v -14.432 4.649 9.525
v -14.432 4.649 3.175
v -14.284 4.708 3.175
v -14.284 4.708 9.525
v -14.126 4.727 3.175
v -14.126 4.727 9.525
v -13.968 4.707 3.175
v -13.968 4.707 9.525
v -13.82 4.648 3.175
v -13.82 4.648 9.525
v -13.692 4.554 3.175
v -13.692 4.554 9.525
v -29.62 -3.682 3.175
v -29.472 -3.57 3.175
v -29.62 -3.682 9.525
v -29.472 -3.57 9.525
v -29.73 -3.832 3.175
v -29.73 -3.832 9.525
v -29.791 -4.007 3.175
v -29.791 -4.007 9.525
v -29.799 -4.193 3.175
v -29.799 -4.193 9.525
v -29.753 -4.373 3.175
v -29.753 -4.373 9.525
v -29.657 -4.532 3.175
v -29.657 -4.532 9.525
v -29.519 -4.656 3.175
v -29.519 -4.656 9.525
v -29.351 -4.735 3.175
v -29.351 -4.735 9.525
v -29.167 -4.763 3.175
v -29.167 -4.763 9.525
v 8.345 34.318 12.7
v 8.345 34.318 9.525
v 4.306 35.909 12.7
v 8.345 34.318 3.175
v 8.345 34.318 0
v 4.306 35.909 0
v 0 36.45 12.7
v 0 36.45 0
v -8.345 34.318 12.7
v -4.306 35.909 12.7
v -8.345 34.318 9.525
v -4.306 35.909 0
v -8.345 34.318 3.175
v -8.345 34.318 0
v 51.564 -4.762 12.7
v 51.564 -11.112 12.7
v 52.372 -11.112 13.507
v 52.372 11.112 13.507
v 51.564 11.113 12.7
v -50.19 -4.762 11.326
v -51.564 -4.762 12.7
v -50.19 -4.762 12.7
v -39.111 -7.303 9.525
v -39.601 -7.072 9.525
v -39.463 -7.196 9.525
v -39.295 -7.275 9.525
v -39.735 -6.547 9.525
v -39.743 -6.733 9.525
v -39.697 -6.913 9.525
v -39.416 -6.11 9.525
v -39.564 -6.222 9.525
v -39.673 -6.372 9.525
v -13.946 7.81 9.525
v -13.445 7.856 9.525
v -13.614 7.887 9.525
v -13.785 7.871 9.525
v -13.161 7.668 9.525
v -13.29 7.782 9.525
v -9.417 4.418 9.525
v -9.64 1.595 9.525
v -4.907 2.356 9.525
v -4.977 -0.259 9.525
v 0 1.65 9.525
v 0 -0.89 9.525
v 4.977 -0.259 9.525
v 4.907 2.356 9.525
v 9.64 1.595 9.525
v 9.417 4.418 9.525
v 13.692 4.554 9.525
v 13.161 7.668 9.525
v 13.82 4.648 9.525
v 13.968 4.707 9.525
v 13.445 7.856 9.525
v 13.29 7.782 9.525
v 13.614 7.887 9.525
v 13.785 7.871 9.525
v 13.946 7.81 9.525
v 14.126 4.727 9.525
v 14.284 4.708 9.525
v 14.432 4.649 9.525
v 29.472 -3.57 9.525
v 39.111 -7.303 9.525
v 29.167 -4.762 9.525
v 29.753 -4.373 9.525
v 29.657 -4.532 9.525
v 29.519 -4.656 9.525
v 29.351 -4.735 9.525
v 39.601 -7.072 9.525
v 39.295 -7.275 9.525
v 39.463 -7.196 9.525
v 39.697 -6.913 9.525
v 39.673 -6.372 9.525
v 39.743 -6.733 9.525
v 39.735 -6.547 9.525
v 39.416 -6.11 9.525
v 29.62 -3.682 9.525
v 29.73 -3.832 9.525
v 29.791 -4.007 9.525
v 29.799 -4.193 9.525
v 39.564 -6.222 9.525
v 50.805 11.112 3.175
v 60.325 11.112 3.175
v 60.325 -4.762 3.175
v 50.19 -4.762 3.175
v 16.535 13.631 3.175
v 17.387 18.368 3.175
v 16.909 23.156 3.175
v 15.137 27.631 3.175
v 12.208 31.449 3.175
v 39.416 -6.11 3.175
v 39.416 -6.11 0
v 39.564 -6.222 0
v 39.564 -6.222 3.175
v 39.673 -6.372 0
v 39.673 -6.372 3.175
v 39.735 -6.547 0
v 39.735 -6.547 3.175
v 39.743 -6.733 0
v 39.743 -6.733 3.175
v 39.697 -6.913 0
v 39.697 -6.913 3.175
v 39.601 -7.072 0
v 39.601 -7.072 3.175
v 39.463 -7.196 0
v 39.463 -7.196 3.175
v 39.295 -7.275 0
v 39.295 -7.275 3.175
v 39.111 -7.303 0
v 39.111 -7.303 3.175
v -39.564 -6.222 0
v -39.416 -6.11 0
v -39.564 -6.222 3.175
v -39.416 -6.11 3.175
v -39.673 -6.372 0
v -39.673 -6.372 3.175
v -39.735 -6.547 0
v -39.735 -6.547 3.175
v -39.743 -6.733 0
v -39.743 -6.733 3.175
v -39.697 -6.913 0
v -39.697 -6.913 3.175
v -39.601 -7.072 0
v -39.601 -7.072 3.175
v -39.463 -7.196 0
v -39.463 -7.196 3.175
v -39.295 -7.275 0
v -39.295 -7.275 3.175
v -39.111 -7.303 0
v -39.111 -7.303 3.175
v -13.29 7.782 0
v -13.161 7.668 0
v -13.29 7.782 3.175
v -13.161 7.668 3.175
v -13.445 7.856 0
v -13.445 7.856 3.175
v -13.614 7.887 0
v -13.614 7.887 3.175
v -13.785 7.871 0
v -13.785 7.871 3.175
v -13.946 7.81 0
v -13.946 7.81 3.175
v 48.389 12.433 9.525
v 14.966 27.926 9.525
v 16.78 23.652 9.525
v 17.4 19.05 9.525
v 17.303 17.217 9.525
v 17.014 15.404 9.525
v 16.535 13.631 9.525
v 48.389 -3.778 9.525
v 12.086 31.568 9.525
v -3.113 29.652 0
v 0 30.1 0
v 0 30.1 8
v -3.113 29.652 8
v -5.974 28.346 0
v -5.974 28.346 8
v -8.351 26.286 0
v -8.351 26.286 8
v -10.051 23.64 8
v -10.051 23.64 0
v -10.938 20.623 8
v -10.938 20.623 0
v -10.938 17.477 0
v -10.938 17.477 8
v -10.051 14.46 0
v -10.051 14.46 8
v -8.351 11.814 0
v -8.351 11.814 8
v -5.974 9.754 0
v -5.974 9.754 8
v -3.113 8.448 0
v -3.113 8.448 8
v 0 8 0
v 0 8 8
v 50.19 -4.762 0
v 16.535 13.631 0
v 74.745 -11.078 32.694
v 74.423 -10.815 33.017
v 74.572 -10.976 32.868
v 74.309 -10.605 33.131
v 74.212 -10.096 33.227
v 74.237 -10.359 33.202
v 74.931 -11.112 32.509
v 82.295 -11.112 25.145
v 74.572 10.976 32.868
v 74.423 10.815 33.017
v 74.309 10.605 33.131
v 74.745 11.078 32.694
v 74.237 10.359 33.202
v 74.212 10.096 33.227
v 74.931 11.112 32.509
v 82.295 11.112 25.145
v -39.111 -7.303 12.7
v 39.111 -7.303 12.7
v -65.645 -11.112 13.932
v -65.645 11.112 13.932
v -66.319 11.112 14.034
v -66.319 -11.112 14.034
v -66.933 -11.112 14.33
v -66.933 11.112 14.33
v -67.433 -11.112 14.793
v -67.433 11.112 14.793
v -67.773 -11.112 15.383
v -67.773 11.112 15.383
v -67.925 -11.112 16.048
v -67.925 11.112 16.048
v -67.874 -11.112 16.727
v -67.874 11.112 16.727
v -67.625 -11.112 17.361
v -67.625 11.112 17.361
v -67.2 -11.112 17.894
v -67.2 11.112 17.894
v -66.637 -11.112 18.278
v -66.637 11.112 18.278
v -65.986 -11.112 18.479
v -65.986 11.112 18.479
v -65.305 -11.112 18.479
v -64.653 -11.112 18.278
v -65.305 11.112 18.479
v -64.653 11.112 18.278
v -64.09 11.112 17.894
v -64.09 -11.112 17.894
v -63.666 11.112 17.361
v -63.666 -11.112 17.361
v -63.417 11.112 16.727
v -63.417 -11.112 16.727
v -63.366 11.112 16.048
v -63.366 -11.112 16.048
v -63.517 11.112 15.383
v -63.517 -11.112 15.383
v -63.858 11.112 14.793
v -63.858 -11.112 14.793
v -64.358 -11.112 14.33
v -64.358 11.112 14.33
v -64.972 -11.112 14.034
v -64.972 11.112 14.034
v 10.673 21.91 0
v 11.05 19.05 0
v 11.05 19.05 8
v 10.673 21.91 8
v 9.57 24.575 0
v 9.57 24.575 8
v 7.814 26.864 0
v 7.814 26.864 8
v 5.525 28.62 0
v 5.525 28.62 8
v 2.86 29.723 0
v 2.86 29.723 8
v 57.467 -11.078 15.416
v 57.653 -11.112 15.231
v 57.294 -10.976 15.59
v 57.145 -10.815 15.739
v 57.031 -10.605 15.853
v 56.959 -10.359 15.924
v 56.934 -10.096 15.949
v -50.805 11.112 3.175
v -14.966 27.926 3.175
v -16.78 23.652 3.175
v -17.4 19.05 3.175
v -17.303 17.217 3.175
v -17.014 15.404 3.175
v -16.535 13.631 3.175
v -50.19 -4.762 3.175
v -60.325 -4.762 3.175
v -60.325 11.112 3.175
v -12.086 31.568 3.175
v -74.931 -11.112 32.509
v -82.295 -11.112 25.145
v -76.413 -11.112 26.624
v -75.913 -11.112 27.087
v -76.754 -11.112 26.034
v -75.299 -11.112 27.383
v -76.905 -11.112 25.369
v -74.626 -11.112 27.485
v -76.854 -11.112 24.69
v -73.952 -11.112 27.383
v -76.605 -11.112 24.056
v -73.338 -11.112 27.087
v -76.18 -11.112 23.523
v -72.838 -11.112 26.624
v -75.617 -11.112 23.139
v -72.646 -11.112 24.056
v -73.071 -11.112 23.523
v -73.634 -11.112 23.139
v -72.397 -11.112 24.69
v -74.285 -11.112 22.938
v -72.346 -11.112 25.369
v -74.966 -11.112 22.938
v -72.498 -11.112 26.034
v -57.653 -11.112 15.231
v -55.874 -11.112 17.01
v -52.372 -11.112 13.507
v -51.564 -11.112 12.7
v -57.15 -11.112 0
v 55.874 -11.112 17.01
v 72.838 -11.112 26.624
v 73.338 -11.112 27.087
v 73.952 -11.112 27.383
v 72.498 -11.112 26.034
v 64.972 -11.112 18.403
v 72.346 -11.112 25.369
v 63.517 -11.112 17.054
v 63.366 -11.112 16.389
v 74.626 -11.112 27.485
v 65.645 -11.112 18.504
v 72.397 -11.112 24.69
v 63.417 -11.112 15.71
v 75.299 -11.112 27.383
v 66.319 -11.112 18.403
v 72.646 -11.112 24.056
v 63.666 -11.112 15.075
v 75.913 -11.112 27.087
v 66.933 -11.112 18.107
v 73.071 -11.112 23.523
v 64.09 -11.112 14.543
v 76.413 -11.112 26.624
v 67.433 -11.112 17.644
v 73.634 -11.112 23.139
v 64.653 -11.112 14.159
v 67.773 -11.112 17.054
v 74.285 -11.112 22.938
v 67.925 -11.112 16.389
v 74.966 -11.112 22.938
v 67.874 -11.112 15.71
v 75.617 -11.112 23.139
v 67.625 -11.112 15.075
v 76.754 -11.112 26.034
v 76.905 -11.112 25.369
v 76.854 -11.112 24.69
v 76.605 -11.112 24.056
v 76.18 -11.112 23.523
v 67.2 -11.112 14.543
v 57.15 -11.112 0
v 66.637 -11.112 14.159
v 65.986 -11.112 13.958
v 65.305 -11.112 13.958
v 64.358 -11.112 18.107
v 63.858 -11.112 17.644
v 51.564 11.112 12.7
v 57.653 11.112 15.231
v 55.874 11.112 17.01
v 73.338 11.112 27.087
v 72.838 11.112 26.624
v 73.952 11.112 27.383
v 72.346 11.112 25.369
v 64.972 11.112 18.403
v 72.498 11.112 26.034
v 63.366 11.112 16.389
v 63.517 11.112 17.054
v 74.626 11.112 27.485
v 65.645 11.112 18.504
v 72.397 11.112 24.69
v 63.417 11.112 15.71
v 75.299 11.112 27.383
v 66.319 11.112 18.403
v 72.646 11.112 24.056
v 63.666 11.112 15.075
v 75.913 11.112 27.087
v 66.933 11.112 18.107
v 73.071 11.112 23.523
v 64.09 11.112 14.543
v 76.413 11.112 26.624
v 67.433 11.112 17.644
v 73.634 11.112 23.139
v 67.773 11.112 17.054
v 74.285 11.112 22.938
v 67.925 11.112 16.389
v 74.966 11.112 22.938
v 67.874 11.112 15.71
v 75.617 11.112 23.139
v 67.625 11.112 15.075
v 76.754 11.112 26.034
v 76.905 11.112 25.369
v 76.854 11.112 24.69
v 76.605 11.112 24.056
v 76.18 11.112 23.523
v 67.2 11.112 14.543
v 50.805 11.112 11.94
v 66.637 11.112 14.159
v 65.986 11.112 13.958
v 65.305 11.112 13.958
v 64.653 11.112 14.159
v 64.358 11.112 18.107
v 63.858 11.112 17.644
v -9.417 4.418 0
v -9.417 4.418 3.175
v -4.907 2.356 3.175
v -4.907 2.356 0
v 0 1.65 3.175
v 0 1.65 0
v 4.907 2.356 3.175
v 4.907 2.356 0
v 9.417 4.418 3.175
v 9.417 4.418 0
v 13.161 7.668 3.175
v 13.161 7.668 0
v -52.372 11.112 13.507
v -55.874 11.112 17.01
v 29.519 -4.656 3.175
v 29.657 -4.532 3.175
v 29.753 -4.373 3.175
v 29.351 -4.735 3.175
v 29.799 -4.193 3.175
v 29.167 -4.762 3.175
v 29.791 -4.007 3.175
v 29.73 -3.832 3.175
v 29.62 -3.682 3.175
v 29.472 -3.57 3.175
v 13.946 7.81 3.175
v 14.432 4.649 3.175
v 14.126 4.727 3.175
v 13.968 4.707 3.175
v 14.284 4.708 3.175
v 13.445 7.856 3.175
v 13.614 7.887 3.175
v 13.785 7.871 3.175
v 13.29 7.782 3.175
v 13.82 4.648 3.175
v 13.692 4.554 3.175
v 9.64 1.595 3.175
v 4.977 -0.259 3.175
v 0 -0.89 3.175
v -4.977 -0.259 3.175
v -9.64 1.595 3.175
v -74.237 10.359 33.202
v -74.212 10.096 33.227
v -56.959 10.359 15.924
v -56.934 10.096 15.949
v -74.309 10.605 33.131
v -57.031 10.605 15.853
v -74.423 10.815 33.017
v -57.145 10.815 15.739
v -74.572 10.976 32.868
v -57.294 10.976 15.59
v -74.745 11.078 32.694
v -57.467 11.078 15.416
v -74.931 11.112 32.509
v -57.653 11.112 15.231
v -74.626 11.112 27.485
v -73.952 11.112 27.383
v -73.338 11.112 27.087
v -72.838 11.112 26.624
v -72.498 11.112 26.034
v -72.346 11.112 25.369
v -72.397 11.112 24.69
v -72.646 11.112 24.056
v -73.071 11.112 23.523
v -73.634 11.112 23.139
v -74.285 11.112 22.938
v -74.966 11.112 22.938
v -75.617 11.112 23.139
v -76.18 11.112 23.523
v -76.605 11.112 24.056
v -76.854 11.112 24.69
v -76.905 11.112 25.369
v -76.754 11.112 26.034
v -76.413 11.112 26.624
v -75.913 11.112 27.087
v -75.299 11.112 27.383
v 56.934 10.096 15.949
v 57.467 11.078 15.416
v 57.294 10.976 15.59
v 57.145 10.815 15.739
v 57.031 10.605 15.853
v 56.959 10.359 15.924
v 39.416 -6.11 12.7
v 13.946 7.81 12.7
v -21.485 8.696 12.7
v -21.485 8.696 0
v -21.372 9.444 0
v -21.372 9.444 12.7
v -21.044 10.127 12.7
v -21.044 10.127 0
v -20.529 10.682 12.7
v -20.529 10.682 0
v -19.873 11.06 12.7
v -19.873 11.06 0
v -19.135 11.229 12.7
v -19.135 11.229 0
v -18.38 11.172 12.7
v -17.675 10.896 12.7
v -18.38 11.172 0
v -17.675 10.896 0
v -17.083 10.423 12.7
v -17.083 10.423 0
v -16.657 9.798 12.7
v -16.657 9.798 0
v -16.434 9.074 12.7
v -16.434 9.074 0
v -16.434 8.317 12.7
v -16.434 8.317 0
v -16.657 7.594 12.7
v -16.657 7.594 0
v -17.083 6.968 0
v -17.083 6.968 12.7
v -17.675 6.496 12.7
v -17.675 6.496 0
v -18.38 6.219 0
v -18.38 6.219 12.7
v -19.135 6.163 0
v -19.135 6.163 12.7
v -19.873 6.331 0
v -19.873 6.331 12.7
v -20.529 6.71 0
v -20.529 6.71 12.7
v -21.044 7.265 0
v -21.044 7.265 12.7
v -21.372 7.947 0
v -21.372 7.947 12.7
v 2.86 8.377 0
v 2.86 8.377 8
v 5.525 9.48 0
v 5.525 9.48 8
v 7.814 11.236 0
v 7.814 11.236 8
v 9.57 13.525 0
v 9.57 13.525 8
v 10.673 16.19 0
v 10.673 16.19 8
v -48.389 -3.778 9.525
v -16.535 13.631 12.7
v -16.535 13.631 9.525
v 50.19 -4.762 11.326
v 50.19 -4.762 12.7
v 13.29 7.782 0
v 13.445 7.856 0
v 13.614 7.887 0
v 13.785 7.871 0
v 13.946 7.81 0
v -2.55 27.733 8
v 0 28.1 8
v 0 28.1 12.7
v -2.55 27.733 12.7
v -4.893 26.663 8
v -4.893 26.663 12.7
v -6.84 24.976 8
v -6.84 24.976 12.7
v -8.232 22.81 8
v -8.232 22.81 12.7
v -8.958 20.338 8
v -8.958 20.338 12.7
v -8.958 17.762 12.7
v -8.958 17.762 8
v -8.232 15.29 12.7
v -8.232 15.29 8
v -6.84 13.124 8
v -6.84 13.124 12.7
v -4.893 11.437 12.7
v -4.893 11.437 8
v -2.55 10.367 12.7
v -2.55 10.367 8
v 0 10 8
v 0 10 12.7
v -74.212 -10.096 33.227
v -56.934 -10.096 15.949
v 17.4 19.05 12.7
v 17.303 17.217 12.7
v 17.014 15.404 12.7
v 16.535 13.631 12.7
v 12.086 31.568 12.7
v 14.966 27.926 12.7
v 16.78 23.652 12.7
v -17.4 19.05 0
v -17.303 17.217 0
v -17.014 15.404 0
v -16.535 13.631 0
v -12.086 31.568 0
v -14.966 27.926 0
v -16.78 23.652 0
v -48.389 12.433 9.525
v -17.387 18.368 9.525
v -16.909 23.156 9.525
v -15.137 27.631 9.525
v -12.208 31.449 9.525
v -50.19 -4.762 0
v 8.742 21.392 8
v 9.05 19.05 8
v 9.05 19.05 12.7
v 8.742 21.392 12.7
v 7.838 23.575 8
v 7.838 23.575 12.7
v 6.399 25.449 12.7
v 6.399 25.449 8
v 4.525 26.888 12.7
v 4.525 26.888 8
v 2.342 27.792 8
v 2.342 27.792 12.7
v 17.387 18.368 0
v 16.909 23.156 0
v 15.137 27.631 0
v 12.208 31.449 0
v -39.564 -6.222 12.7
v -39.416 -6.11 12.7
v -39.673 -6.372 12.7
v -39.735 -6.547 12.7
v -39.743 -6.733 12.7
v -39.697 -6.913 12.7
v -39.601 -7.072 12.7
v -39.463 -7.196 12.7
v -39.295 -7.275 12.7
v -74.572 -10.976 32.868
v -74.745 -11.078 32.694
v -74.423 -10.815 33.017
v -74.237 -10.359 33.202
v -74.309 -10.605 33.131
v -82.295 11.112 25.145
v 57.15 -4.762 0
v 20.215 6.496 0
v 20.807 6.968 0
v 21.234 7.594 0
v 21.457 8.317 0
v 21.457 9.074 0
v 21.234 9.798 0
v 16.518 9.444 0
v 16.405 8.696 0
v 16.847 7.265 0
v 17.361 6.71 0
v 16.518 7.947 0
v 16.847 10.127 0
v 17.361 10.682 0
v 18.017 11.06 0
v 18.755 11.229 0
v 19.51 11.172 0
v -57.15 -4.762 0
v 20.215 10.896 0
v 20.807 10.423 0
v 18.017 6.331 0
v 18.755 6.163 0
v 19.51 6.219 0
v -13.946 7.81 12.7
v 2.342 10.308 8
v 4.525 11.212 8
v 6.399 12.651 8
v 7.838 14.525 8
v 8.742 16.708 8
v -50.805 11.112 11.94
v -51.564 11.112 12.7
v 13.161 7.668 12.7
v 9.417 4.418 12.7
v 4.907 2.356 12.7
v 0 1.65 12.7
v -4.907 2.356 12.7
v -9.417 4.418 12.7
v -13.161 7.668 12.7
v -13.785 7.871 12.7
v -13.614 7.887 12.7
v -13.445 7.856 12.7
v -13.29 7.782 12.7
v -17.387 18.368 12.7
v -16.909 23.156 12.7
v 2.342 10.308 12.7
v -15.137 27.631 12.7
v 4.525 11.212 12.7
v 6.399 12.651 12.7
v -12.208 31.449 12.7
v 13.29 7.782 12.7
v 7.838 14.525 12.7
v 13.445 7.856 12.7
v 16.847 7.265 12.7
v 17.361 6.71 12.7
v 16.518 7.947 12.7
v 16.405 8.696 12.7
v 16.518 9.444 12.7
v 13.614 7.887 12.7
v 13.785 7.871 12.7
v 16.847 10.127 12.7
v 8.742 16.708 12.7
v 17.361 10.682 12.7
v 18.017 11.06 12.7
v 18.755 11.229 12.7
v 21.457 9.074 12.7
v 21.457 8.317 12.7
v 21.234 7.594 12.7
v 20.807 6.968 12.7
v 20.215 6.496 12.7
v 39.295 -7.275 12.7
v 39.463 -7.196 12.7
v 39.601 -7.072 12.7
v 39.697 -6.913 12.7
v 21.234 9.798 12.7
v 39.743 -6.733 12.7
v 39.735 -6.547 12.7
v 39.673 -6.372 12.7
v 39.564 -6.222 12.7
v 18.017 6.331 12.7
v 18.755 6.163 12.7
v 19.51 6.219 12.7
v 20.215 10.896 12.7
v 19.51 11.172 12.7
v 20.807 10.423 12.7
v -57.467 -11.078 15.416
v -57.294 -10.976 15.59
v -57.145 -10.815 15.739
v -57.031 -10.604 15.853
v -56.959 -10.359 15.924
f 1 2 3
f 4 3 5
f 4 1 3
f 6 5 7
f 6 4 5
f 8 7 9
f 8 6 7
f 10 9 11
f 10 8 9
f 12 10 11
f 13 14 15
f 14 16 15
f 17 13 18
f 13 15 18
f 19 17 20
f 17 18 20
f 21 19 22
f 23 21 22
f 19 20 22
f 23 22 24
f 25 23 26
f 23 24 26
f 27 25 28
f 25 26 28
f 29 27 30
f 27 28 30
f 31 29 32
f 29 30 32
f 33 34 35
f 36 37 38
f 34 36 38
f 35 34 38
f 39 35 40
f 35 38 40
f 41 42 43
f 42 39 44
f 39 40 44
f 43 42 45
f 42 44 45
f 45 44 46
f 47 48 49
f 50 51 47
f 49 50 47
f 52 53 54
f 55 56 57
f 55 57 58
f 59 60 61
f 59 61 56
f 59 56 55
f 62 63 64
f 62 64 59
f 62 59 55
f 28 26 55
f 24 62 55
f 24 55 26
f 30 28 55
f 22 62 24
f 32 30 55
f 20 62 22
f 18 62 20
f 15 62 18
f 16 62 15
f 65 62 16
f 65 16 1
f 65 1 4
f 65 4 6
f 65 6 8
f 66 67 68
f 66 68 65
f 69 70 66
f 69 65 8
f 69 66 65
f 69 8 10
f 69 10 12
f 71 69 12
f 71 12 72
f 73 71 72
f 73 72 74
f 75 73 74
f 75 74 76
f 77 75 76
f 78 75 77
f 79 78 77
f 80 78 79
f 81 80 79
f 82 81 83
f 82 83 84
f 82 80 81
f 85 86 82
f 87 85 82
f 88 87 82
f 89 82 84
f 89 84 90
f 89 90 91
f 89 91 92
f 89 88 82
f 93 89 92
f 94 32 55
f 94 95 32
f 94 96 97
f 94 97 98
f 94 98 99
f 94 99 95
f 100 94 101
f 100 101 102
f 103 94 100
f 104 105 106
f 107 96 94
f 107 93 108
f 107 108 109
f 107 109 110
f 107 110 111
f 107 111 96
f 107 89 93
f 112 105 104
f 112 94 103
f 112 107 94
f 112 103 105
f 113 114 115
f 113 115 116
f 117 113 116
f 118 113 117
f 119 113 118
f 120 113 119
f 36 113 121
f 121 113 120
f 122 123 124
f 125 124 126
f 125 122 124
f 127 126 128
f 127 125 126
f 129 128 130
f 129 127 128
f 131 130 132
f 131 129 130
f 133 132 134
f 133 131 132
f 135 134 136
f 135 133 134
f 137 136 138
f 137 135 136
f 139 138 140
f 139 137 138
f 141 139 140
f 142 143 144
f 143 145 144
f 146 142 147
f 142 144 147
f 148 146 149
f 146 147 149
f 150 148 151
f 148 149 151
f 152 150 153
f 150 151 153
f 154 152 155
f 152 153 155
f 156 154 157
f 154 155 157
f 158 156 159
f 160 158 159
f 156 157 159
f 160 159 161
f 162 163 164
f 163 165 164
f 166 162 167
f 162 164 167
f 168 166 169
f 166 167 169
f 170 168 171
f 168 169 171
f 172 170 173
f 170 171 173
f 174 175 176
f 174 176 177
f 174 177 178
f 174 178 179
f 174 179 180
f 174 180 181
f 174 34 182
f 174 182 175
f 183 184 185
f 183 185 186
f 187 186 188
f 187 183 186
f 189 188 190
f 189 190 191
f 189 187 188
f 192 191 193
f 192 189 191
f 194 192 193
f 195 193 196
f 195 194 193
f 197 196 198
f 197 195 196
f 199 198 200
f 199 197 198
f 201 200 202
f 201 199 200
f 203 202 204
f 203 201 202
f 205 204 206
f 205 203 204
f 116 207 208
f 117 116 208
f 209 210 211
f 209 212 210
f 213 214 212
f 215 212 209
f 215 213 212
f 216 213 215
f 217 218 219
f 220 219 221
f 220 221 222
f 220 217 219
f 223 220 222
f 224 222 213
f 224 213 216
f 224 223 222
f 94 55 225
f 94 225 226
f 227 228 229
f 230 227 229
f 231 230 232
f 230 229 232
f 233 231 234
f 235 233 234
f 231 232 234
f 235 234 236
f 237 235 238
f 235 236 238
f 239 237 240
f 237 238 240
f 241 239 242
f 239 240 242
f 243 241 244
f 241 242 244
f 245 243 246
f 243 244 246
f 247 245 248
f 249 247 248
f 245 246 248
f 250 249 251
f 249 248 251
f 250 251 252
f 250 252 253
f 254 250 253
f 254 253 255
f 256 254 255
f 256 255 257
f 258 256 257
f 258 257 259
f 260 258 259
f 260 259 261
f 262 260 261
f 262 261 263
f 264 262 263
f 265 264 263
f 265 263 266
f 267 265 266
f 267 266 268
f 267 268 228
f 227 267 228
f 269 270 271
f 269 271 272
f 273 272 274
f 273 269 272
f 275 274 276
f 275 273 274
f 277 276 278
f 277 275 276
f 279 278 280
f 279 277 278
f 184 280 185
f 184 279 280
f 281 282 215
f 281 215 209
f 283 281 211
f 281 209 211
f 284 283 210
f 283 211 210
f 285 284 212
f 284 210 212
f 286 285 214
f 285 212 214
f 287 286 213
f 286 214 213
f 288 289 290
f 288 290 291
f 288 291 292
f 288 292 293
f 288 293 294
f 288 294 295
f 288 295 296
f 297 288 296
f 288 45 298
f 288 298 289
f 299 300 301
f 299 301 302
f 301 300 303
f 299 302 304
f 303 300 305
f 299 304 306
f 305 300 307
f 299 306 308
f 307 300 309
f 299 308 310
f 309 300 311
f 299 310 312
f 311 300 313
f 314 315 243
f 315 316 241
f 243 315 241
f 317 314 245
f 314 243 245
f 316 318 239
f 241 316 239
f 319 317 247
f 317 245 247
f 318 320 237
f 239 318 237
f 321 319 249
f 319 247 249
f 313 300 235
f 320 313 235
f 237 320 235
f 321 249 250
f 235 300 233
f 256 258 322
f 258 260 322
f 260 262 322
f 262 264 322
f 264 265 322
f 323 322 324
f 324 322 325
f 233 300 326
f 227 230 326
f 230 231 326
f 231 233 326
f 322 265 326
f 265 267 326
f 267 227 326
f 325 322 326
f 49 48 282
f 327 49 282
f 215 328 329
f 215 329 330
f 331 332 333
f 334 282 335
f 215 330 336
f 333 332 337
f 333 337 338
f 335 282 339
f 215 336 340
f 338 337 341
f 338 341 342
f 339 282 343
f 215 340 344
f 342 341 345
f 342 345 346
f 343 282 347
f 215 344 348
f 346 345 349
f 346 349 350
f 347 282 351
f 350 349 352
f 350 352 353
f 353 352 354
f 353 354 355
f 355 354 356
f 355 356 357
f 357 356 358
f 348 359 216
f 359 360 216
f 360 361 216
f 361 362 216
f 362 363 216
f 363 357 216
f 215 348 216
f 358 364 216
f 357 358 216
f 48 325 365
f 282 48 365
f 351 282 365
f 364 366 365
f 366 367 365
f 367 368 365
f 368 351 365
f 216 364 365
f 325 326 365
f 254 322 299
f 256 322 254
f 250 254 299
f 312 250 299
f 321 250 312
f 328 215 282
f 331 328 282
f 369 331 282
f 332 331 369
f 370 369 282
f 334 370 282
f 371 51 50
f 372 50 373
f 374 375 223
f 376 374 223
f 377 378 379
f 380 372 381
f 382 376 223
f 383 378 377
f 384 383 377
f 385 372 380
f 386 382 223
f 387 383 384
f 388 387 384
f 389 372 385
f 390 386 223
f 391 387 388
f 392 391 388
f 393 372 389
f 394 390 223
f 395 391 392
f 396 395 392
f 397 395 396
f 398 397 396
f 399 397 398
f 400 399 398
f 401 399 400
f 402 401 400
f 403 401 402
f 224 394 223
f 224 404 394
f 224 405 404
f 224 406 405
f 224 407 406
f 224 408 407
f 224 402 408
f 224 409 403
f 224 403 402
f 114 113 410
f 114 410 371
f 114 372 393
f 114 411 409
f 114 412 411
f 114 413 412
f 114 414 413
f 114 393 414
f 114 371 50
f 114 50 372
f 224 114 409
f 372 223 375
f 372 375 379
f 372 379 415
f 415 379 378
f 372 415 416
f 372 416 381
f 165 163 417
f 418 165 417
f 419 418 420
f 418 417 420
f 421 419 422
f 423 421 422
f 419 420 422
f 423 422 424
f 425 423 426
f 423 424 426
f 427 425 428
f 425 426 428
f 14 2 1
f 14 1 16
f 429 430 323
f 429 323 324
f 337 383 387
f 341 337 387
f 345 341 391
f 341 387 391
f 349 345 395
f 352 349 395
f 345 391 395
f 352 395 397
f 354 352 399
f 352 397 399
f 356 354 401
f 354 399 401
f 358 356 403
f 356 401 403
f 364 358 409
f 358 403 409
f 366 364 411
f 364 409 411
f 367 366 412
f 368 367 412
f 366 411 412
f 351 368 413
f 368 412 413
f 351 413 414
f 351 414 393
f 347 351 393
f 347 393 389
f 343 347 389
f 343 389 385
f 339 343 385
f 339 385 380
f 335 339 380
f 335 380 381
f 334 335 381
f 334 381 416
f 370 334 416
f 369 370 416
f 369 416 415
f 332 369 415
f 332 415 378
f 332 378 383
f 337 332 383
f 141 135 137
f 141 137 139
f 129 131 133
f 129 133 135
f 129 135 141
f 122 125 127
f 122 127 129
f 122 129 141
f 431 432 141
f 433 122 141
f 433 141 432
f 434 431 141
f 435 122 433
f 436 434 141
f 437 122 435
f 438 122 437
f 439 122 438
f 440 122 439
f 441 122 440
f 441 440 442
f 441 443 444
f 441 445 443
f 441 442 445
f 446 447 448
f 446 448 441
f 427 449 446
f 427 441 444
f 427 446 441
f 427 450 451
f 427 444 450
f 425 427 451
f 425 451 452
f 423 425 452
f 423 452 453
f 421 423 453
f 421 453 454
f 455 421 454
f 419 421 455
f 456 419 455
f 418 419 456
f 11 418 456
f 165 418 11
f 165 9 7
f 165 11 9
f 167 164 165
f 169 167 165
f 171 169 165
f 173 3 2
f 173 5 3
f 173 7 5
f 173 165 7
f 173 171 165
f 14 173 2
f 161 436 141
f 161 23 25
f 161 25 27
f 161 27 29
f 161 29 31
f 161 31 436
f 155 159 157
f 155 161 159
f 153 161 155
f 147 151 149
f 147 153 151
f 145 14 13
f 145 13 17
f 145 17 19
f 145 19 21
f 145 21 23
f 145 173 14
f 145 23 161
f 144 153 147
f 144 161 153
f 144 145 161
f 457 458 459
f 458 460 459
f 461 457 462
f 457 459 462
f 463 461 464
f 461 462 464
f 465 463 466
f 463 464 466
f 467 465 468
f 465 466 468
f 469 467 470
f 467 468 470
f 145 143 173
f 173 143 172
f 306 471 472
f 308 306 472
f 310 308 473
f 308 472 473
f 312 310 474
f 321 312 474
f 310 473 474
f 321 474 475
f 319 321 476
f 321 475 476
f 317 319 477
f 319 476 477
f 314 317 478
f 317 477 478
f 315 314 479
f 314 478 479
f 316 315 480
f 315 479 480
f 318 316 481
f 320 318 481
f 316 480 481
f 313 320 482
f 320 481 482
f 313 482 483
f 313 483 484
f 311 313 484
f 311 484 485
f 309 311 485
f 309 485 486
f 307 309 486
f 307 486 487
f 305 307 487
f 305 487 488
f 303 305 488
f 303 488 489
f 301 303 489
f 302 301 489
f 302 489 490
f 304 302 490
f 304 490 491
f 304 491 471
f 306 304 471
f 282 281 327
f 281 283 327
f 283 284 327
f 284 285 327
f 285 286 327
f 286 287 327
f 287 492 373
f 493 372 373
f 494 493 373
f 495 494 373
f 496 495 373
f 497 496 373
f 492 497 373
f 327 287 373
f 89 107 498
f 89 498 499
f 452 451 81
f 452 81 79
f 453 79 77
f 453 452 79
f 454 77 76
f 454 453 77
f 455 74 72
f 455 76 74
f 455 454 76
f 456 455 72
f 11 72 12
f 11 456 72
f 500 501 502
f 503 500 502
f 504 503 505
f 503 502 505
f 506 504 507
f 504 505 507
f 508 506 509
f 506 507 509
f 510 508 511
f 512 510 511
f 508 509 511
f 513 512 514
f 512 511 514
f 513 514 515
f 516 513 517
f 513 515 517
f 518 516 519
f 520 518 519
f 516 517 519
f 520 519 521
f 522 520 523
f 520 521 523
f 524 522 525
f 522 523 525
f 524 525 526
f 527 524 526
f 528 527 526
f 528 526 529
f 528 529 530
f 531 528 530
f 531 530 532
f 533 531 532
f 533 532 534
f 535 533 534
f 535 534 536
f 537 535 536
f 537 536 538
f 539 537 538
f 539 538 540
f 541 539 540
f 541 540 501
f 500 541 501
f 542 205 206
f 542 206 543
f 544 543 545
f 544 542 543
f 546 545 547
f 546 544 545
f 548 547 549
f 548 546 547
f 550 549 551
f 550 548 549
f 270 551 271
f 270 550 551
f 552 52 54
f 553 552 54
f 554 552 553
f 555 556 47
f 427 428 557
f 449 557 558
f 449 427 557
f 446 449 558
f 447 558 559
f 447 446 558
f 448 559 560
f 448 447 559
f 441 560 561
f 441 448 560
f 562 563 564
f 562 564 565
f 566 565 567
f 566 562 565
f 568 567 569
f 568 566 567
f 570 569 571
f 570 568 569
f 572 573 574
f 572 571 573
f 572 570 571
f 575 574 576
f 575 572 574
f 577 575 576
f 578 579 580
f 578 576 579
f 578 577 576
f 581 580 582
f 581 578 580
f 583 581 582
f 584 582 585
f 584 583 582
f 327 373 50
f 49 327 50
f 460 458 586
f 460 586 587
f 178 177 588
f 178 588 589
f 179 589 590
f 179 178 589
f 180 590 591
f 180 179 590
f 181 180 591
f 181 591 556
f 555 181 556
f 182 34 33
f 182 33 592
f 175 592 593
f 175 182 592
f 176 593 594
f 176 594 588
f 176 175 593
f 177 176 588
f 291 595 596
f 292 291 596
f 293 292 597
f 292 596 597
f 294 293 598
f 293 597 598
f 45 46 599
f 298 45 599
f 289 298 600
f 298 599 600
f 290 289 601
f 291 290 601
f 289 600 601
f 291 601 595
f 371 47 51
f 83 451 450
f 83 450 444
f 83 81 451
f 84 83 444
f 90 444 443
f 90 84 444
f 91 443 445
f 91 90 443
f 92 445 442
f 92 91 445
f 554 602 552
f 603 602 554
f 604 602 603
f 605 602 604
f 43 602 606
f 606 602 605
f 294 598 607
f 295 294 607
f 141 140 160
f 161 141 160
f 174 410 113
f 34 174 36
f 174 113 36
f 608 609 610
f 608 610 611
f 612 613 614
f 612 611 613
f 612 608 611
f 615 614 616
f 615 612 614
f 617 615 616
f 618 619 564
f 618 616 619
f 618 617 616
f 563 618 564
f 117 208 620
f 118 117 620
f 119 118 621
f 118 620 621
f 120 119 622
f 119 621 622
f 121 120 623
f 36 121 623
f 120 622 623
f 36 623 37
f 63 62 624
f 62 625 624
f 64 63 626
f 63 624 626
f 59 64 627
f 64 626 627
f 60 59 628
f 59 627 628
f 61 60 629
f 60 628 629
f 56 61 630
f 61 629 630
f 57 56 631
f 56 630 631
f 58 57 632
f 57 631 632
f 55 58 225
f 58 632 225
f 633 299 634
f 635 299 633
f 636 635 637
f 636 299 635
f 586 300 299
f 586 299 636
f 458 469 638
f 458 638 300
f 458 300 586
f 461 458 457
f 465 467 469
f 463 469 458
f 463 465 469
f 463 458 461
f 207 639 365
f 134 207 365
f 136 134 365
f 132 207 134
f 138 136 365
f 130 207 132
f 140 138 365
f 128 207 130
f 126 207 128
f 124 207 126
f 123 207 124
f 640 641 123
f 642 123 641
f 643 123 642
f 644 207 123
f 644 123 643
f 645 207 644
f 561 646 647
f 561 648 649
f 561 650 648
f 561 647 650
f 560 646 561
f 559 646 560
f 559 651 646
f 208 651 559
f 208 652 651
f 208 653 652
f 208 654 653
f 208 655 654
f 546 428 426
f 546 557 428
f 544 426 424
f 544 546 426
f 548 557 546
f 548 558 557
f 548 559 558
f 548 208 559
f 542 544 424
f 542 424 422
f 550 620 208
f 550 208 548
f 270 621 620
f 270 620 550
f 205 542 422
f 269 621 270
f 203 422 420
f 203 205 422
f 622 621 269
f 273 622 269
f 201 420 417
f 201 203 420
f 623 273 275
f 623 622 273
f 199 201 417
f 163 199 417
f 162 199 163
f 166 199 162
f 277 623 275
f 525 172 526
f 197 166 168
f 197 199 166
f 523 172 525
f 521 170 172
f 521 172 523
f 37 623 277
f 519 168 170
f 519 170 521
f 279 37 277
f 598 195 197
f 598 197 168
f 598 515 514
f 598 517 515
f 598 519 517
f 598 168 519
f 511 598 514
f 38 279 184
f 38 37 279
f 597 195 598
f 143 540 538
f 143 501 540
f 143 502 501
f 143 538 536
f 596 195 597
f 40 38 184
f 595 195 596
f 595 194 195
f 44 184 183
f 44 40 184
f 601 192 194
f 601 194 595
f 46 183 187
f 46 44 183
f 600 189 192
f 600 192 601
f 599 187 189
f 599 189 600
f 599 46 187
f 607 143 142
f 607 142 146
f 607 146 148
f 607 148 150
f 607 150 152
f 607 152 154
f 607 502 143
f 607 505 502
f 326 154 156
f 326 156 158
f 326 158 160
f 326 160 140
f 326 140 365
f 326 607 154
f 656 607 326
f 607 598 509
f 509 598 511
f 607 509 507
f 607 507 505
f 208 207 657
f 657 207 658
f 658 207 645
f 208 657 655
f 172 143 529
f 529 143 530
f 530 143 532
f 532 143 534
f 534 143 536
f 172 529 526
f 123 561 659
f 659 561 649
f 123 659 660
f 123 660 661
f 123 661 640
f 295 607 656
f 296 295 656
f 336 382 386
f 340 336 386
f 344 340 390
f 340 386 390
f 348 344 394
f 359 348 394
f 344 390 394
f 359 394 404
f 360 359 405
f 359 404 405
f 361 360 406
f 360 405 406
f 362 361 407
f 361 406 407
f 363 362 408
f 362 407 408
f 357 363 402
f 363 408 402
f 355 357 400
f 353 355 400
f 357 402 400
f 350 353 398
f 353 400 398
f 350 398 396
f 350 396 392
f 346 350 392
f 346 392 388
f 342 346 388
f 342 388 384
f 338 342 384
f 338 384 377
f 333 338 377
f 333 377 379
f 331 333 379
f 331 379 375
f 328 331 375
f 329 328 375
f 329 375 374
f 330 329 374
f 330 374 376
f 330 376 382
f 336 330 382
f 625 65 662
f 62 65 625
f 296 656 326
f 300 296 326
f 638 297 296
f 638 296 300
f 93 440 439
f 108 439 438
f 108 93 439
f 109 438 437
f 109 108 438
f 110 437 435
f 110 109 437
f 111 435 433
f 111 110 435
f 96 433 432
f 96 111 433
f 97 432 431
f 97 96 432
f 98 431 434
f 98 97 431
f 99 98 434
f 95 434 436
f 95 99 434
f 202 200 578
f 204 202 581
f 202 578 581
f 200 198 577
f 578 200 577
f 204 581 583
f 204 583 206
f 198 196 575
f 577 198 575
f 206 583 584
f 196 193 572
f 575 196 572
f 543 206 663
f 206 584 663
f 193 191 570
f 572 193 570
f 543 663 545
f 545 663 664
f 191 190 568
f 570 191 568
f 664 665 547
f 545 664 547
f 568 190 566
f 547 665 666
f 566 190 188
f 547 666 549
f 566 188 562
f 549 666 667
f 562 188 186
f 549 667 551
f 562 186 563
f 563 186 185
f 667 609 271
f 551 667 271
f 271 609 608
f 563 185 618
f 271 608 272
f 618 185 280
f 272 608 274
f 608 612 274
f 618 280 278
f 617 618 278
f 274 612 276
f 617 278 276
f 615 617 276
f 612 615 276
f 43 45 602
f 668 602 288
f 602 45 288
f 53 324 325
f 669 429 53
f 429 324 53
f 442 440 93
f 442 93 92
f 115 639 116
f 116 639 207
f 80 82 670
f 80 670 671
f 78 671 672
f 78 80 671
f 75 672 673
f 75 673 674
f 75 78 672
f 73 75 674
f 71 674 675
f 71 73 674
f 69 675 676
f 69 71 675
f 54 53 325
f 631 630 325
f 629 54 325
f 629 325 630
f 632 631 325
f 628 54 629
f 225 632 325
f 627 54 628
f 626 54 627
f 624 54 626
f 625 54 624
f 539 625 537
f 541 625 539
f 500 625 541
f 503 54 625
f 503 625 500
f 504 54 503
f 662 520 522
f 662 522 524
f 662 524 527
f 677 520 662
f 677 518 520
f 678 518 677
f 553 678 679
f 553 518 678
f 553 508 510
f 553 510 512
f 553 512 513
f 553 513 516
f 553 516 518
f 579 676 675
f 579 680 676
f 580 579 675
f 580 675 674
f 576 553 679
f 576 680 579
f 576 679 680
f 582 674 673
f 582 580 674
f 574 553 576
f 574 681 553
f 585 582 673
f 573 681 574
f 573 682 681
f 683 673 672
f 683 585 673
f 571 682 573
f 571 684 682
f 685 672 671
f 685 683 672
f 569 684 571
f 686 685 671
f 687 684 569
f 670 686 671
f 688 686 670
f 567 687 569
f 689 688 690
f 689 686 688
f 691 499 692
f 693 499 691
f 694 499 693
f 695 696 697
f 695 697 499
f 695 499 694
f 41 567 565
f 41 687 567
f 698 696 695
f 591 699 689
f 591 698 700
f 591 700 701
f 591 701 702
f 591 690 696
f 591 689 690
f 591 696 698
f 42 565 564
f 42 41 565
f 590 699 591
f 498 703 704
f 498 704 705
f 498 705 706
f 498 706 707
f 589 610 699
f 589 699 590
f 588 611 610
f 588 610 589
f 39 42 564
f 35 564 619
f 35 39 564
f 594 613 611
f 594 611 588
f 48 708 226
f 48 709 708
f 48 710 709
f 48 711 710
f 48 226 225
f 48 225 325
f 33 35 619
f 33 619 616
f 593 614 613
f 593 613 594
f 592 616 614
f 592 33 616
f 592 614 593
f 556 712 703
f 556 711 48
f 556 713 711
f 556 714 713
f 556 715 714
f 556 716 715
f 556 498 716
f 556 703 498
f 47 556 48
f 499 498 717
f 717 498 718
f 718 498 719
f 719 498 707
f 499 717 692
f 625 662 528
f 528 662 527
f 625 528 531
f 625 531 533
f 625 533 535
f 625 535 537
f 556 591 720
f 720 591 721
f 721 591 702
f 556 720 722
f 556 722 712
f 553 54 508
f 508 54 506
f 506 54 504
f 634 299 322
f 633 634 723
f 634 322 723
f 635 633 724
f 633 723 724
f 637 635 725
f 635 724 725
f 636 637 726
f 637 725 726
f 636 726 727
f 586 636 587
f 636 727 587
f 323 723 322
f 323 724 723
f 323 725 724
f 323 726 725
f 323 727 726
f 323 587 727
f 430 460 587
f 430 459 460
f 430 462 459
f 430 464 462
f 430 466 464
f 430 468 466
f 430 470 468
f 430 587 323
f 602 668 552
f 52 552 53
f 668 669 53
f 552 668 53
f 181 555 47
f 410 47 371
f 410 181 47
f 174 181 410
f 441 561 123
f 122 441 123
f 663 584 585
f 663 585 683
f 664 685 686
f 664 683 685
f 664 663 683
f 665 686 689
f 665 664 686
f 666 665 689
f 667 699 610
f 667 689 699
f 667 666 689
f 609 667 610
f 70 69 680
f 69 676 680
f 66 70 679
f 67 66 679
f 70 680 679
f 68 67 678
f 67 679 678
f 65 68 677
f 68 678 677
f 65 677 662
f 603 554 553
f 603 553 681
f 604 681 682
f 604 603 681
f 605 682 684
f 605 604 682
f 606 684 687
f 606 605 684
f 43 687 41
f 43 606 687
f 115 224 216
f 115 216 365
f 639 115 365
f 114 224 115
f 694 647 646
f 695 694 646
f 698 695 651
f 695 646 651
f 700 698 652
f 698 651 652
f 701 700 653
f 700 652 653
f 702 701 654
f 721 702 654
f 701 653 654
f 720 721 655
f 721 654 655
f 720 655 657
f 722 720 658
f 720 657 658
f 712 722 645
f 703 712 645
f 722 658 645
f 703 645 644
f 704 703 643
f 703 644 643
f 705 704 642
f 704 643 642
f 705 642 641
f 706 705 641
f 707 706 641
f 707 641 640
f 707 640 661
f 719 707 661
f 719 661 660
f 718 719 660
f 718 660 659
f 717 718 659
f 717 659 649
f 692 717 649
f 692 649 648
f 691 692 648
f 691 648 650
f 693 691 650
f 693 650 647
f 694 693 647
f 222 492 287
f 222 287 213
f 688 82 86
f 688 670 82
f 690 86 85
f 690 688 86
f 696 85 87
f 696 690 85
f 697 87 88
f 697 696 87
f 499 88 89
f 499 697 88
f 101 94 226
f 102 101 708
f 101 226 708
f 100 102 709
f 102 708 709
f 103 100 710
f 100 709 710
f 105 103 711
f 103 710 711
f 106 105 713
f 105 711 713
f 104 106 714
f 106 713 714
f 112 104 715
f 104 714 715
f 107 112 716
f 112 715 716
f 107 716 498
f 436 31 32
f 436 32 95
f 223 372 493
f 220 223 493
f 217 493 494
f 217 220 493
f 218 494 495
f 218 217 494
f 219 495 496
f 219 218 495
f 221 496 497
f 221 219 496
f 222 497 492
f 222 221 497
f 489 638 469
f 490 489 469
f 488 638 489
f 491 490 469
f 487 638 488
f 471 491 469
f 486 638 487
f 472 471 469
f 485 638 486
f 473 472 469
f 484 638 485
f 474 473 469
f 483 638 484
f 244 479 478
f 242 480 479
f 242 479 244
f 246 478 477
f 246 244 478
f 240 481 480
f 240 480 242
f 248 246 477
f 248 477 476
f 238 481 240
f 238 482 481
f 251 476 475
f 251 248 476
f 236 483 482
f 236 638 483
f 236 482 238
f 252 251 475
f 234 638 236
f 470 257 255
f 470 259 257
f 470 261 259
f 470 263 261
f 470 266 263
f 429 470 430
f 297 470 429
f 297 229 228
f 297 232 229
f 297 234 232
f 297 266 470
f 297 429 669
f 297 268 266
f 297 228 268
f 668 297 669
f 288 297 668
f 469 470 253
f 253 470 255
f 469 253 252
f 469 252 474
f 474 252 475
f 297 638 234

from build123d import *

# Parameters (mm, degrees)
BOSS_EXTRUDE1_DEPTH = 11.1125
BOSS_EXTRUDE2_DEPTH = 12.7
CUT_EXTRUDE2_DEPTH  = 8
CUT_EXTRUDE3_DEPTH  = 96.942967533
SKETCH5_W           = 25.144717139
SKETCH5_H           = 15.875
CUT_EXTRUDE4_DEPTH  = 3.175
CUT_EXTRUDE5_DEPTH  = 96.942967533
SKETCH6_R           = 2.54
CUT_EXTRUDE6_DEPTH  = 96.942967533
CUT_EXTRUDE7_START  = -3.175
CUT_EXTRUDE7_DEPTH  = 3.175
CHAMFER1_SIZE       = 3.175
FILLET1_R           = 0.635
FILLET3_R           = 1.016
SKETCH8_R           = 2.286
CUT_EXTRUDE8_DEPTH  = 93.295392221


with BuildPart() as part:
    # Sketch3 → Boss-Extrude1 (new, symmetric)
    with BuildSketch(Plane(origin=(0, 0, 0), x_dir=(1, 0, 0), z_dir=(0, 1, 0))):
        Polygon((-56.934473853, -15.948934871), (-65.016704362, -7.866704362), (-82.294717139, -25.144717139), (-74.93090712, -32.508527158), (-74.21248663, -33.226947648), align=None)
        Polygon((-65.016704362, -7.866704362), (-55.873813681, -17.009595043), (-52.371513794, -13.507295156), (-61.514404475, -4.364404475), align=None)
        Polygon((-52.371513794, -13.507295156), (-51.564218639, -12.7), (-17.311249955, -12.7), (0, -12.7), (0, 0), (-17.311249955, 0), (-57.15, 0), (-60.325, -3.175), (-61.514404475, -4.364404475), align=None)
        Polygon((0, 0), (0, -12.7), (17.311249955, -12.7), (51.564218639, -12.7), (52.371513794, -13.507295156), (61.514404475, -4.364404475), (60.325, -3.175), (57.15, 0), (17.311249955, 0), align=None)
        Polygon((61.514404475, -4.364404475), (65.016704362, -7.866704362), (55.873813681, -17.009595043), (52.371513794, -13.507295156), align=None)
        Polygon((65.016704362, -7.866704362), (56.934473853, -15.948934871), (74.21248663, -33.226947648), (74.93090712, -32.508527158), (82.294717139, -25.144717139), align=None)
    extrude(amount=BOSS_EXTRUDE1_DEPTH, both=True)

    # Sketch2 → Boss-Extrude2 (add)
    with BuildSketch(Plane.XY):
        with BuildLine():
            Line((-50.804788276, 11.1125), (50.804788276, 11.1125))
            Line((50.804788276, 11.1125), (8.344749207, 34.318436746))
            ThreePointArc((8.344749207, 34.318436746), (0, 36.45), (-8.344749207, 34.318436746))
            Line((-8.344749207, 34.318436746), (-50.804788276, 11.1125))
        make_face()
    extrude(amount=BOSS_EXTRUDE2_DEPTH)

    # Sketch2<3> → Cut-Extrude2 (cut)
    with BuildSketch(Plane.XY):
        with BuildLine():
            ThreePointArc((0, 30.1), (-11.05, 19.05), (0, 8))
            Line((0, 8), (0, 10))
            ThreePointArc((0, 10), (-9.05, 19.05), (0, 28.1))
            Line((0, 28.1), (0, 30.1))
        make_face()
        with BuildLine():
            Line((0, 10), (0, 8))
            ThreePointArc((0, 8), (7.813529932, 11.236470068), (11.05, 19.05))
            ThreePointArc((11.05, 19.05), (7.813529932, 26.863529932), (0, 30.1))
            Line((0, 30.1), (0, 28.1))
            ThreePointArc((0, 28.1), (6.39931637, 25.44931637), (9.05, 19.05))
            ThreePointArc((9.05, 19.05), (6.39931637, 12.65068363), (0, 10))
        make_face()
        with BuildLine():
            ThreePointArc((0, 28.1), (-9.05, 19.05), (0, 10))
            Line((0, 10), (0, 28.1))
        make_face()
        with BuildLine():
            Line((0, 28.1), (0, 10))
            ThreePointArc((0, 10), (6.39931637, 12.65068363), (9.05, 19.05))
            ThreePointArc((9.05, 19.05), (6.39931637, 25.44931637), (0, 28.1))
        make_face()
    extrude(amount=CUT_EXTRUDE2_DEPTH, mode=Mode.SUBTRACT)

    # Sketch2<5> → Cut-Extrude3 (cut, through all)
    with BuildSketch(Plane.XY):
        with BuildLine():
            ThreePointArc((0, 28.1), (-9.05, 19.05), (0, 10))
            Line((0, 10), (0, 28.1))
        make_face()
        with BuildLine():
            Line((0, 28.1), (0, 10))
            ThreePointArc((0, 10), (6.39931637, 12.65068363), (9.05, 19.05))
            ThreePointArc((9.05, 19.05), (6.39931637, 25.44931637), (0, 28.1))
        make_face()
    extrude(amount=CUT_EXTRUDE3_DEPTH, mode=Mode.SUBTRACT)

    # Sketch5 → Cut-Extrude4 (cut)
    # profile 1 of 5: a face of its own
    with BuildSketch(Plane(origin=(0, 0, 0), x_dir=(-1, 0, 0), z_dir=(0, 0, -1))):
        with Locations((-69.72235857, 3.175)):
            Rectangle(SKETCH5_W, SKETCH5_H)
    # profile 2 of 5: a face of its own
    with BuildSketch(Plane(origin=(0, 0, 0), x_dir=(-1, 0, 0), z_dir=(0, 0, -1))):
        with BuildLine():
            Line((-50.190202202, -4.7625), (-16.534774751, 13.631400187))
            ThreePointArc((-16.534774751, 13.631400187), (-16.178258512, 25.454994263), (-8.344749207, 34.318436746))
            Line((-8.344749207, 34.318436746), (-50.804788276, 11.1125))
            Line((-50.804788276, 11.1125), (-57.15, 11.1125))
            Line((-57.15, 11.1125), (-57.15, -4.7625))
            Line((-57.15, -4.7625), (-50.190202202, -4.7625))
        make_face()
    # profile 3 of 5: a face of its own
    with BuildSketch(Plane(origin=(0, 0, 0), x_dir=(-1, 0, 0), z_dir=(0, 0, -1))):
        with BuildLine():
            Line((50.804788276, 11.1125), (8.344749207, 34.318436746))
            ThreePointArc((8.344749207, 34.318436746), (14.965938597, 27.925848236), (17.4, 19.05))
            ThreePointArc((17.4, 19.05), (17.182332215, 16.306378367), (16.534774751, 13.631400187))
            Line((16.534774751, 13.631400187), (50.190202202, -4.7625))
            Line((50.190202202, -4.7625), (57.15, -4.7625))
            Line((57.15, -4.7625), (57.15, 11.1125))
            Line((57.15, 11.1125), (50.804788276, 11.1125))
        make_face()
    # profile 4 of 5: a face of its own
    with BuildSketch(Plane(origin=(0, 0, 0), x_dir=(-1, 0, 0), z_dir=(0, 0, -1))):
        with Locations((69.72235857, 3.175)):
            Rectangle(SKETCH5_W, SKETCH5_H)
    # profile 5 of 5: a face of its own
    with BuildSketch(Plane(origin=(0, 0, 0), x_dir=(-1, 0, 0), z_dir=(0, 0, -1))):
        with BuildLine():
            ThreePointArc((13.489420874, 8.059298271), (0, 1.65), (-13.489420874, 8.059298271))
            Line((-13.489420874, 8.059298271), (-41.5969936, -7.3025))
            Line((-41.5969936, -7.3025), (41.5969936, -7.3025))
            Line((41.5969936, -7.3025), (13.489420874, 8.059298271))
        make_face()
        with BuildLine():
            Line((31.653276027, -4.7625), (-31.653276027, -4.7625))
            Line((-31.653276027, -4.7625), (-14.022402602, 4.873405723))
            ThreePointArc((-14.022402602, 4.873405723), (0, -0.89), (14.022402602, 4.873405723))
            Line((14.022402602, 4.873405723), (31.653276027, -4.7625))
        make_face(mode=Mode.SUBTRACT)
    extrude(amount=-CUT_EXTRUDE4_DEPTH, mode=Mode.SUBTRACT)

    # Sketch5<3> → Cut-Extrude5 (cut, through all)
    with BuildSketch(Plane(origin=(0, 0, 0), x_dir=(-1, 0, 0), z_dir=(0, 0, -1))):
        with BuildLine():
            ThreePointArc((-14.022402602, 4.873405723), (0, -0.89), (14.022402602, 4.873405723))
            Line((14.022402602, 4.873405723), (31.653276027, -4.7625))
            Line((31.653276027, -4.7625), (-31.653276027, -4.7625))
            Line((-31.653276027, -4.7625), (-14.022402602, 4.873405723))
        make_face()
    extrude(amount=-CUT_EXTRUDE5_DEPTH, mode=Mode.SUBTRACT)

    # Sketch6 → Cut-Extrude6 (cut, through all)
    with BuildSketch(Plane(origin=(0, 0, 0), x_dir=(-1, 0, 0), z_dir=(0, 0, -1))):
        with Locations((-18.945146514, 8.695796817)):
            Circle(SKETCH6_R)
        with Locations((18.945146514, 8.695796817)):
            Circle(SKETCH6_R)
    extrude(amount=-CUT_EXTRUDE6_DEPTH, mode=Mode.SUBTRACT)

    # Sketch7 → Cut-Extrude7 (cut)
    # profile 1 of 3: a face of its own
    with BuildSketch(Plane.XY.offset(12.7).offset(CUT_EXTRUDE7_START)):
        with BuildLine():
            ThreePointArc((13.489420874, 8.059298271), (0, 1.65), (-13.489420874, 8.059298271))
            Line((-13.489420874, 8.059298271), (-41.5969936, -7.3025))
            Line((-41.5969936, -7.3025), (41.5969936, -7.3025))
            Line((41.5969936, -7.3025), (13.489420874, 8.059298271))
        make_face()
        with BuildLine():
            Line((-31.653276027, -4.7625), (-14.022402602, 4.873405723))
            ThreePointArc((-14.022402602, 4.873405723), (0, -0.89), (14.022402602, 4.873405723))
            Line((14.022402602, 4.873405723), (31.653276027, -4.7625))
            Line((31.653276027, -4.7625), (-31.653276027, -4.7625))
        make_face(mode=Mode.SUBTRACT)
    # profile 2 of 3: a face of its own
    with BuildSketch(Plane.XY.offset(12.7).offset(CUT_EXTRUDE7_START)):
        with BuildLine():
            Line((-51.564218639, -4.7625), (-50.190202202, -4.7625))
            Line((-50.190202202, -4.7625), (-16.534774751, 13.631400187))
            ThreePointArc((-16.534774751, 13.631400187), (-16.178258512, 25.454994263), (-8.344749207, 34.318436746))
            Line((-8.344749207, 34.318436746), (-50.804788276, 11.1125))
            Line((-50.804788276, 11.1125), (-51.564218639, 11.1125))
            Line((-51.564218639, 11.1125), (-51.564218639, -4.7625))
        make_face()
    # profile 3 of 3: a face of its own
    with BuildSketch(Plane.XY.offset(12.7).offset(CUT_EXTRUDE7_START)):
        with BuildLine():
            Line((50.804788276, 11.1125), (8.344749207, 34.318436746))
            ThreePointArc((8.344749207, 34.318436746), (14.965938597, 27.925848236), (17.4, 19.05))
            ThreePointArc((17.4, 19.05), (17.182332215, 16.306378367), (16.534774751, 13.631400187))
            Line((16.534774751, 13.631400187), (50.190202202, -4.7625))
            Line((50.190202202, -4.7625), (51.564218639, -4.7625))
            Line((51.564218639, -4.7625), (51.564218639, 11.1125))
            Line((51.564218639, 11.1125), (50.804788276, 11.1125))
        make_face()
    extrude(amount=CUT_EXTRUDE7_DEPTH, mode=Mode.SUBTRACT)

    # Chamfer1
    chamfer1_edges = [part.edges().sort_by_distance(p)[0] for p in [
        (51.564218639, 3.175, 9.525),
        (-51.564218639, 3.175, 9.525),
    ]]
    chamfer(chamfer1_edges, length=CHAMFER1_SIZE - 0.0001)  # a hair under: the kernel refuses the full size

    # Fillet1
    fillet1_edges = [part.edges().sort_by_distance(p)[0] for p in [
        (13.489420874, 8.059298271, 1.5875),
        (-13.489420874, 8.059298271, 1.5875),
        (-41.5969936, -7.3025, 1.5875),
        (41.5969936, -7.3025, 1.5875),
        (14.022402602, 4.873405723, 6.35),
        (31.653276027, -4.7625, 6.35),
        (-31.653276027, -4.7625, 6.35),
        (-14.022402602, 4.873405723, 6.35),
        (-13.489420874, 8.059298271, 11.1125),
        (13.489420874, 8.059298271, 11.1125),
        (41.5969936, -7.3025, 11.1125),
        (-41.5969936, -7.3025, 11.1125),
    ]]
    fillet(fillet1_edges, radius=FILLET1_R)

    # Fillet3
    fillet3_edges = [part.edges().sort_by_distance(p)[0] for p in [
        (65.573480242, -11.1125, 24.587941259),
        (-65.573480242, -11.1125, 24.587941259),
        (65.573480242, 11.1125, 24.587941259),
        (-65.573480242, 11.1125, 24.587941259),
    ]]
    fillet(fillet3_edges, radius=FILLET3_R)

    # Sketch8 → Cut-Extrude8 (cut, through all)
    with BuildSketch(Plane(origin=(0, 11.1125, 0), x_dir=(1, 0, 0), z_dir=(0, 1, 0))):
        with Locations(Location((74.625578412, -25.198598676, 0), (0, 0, 270))):
            Circle(SKETCH8_R)
        with Locations(Location((-74.625578412, -25.198598676, 0), (0, 0, 270))):
            Circle(SKETCH8_R)
        with Locations(Location((65.645322291, -16.218342555, 0), (0, 0, 270))):
            Circle(SKETCH8_R)
        with Locations(Location((-65.645322291, -16.218342555, 0), (0, 0, 90))):
            Circle(SKETCH8_R)
    extrude(amount=-CUT_EXTRUDE8_DEPTH, mode=Mode.SUBTRACT)


solid = part.part
